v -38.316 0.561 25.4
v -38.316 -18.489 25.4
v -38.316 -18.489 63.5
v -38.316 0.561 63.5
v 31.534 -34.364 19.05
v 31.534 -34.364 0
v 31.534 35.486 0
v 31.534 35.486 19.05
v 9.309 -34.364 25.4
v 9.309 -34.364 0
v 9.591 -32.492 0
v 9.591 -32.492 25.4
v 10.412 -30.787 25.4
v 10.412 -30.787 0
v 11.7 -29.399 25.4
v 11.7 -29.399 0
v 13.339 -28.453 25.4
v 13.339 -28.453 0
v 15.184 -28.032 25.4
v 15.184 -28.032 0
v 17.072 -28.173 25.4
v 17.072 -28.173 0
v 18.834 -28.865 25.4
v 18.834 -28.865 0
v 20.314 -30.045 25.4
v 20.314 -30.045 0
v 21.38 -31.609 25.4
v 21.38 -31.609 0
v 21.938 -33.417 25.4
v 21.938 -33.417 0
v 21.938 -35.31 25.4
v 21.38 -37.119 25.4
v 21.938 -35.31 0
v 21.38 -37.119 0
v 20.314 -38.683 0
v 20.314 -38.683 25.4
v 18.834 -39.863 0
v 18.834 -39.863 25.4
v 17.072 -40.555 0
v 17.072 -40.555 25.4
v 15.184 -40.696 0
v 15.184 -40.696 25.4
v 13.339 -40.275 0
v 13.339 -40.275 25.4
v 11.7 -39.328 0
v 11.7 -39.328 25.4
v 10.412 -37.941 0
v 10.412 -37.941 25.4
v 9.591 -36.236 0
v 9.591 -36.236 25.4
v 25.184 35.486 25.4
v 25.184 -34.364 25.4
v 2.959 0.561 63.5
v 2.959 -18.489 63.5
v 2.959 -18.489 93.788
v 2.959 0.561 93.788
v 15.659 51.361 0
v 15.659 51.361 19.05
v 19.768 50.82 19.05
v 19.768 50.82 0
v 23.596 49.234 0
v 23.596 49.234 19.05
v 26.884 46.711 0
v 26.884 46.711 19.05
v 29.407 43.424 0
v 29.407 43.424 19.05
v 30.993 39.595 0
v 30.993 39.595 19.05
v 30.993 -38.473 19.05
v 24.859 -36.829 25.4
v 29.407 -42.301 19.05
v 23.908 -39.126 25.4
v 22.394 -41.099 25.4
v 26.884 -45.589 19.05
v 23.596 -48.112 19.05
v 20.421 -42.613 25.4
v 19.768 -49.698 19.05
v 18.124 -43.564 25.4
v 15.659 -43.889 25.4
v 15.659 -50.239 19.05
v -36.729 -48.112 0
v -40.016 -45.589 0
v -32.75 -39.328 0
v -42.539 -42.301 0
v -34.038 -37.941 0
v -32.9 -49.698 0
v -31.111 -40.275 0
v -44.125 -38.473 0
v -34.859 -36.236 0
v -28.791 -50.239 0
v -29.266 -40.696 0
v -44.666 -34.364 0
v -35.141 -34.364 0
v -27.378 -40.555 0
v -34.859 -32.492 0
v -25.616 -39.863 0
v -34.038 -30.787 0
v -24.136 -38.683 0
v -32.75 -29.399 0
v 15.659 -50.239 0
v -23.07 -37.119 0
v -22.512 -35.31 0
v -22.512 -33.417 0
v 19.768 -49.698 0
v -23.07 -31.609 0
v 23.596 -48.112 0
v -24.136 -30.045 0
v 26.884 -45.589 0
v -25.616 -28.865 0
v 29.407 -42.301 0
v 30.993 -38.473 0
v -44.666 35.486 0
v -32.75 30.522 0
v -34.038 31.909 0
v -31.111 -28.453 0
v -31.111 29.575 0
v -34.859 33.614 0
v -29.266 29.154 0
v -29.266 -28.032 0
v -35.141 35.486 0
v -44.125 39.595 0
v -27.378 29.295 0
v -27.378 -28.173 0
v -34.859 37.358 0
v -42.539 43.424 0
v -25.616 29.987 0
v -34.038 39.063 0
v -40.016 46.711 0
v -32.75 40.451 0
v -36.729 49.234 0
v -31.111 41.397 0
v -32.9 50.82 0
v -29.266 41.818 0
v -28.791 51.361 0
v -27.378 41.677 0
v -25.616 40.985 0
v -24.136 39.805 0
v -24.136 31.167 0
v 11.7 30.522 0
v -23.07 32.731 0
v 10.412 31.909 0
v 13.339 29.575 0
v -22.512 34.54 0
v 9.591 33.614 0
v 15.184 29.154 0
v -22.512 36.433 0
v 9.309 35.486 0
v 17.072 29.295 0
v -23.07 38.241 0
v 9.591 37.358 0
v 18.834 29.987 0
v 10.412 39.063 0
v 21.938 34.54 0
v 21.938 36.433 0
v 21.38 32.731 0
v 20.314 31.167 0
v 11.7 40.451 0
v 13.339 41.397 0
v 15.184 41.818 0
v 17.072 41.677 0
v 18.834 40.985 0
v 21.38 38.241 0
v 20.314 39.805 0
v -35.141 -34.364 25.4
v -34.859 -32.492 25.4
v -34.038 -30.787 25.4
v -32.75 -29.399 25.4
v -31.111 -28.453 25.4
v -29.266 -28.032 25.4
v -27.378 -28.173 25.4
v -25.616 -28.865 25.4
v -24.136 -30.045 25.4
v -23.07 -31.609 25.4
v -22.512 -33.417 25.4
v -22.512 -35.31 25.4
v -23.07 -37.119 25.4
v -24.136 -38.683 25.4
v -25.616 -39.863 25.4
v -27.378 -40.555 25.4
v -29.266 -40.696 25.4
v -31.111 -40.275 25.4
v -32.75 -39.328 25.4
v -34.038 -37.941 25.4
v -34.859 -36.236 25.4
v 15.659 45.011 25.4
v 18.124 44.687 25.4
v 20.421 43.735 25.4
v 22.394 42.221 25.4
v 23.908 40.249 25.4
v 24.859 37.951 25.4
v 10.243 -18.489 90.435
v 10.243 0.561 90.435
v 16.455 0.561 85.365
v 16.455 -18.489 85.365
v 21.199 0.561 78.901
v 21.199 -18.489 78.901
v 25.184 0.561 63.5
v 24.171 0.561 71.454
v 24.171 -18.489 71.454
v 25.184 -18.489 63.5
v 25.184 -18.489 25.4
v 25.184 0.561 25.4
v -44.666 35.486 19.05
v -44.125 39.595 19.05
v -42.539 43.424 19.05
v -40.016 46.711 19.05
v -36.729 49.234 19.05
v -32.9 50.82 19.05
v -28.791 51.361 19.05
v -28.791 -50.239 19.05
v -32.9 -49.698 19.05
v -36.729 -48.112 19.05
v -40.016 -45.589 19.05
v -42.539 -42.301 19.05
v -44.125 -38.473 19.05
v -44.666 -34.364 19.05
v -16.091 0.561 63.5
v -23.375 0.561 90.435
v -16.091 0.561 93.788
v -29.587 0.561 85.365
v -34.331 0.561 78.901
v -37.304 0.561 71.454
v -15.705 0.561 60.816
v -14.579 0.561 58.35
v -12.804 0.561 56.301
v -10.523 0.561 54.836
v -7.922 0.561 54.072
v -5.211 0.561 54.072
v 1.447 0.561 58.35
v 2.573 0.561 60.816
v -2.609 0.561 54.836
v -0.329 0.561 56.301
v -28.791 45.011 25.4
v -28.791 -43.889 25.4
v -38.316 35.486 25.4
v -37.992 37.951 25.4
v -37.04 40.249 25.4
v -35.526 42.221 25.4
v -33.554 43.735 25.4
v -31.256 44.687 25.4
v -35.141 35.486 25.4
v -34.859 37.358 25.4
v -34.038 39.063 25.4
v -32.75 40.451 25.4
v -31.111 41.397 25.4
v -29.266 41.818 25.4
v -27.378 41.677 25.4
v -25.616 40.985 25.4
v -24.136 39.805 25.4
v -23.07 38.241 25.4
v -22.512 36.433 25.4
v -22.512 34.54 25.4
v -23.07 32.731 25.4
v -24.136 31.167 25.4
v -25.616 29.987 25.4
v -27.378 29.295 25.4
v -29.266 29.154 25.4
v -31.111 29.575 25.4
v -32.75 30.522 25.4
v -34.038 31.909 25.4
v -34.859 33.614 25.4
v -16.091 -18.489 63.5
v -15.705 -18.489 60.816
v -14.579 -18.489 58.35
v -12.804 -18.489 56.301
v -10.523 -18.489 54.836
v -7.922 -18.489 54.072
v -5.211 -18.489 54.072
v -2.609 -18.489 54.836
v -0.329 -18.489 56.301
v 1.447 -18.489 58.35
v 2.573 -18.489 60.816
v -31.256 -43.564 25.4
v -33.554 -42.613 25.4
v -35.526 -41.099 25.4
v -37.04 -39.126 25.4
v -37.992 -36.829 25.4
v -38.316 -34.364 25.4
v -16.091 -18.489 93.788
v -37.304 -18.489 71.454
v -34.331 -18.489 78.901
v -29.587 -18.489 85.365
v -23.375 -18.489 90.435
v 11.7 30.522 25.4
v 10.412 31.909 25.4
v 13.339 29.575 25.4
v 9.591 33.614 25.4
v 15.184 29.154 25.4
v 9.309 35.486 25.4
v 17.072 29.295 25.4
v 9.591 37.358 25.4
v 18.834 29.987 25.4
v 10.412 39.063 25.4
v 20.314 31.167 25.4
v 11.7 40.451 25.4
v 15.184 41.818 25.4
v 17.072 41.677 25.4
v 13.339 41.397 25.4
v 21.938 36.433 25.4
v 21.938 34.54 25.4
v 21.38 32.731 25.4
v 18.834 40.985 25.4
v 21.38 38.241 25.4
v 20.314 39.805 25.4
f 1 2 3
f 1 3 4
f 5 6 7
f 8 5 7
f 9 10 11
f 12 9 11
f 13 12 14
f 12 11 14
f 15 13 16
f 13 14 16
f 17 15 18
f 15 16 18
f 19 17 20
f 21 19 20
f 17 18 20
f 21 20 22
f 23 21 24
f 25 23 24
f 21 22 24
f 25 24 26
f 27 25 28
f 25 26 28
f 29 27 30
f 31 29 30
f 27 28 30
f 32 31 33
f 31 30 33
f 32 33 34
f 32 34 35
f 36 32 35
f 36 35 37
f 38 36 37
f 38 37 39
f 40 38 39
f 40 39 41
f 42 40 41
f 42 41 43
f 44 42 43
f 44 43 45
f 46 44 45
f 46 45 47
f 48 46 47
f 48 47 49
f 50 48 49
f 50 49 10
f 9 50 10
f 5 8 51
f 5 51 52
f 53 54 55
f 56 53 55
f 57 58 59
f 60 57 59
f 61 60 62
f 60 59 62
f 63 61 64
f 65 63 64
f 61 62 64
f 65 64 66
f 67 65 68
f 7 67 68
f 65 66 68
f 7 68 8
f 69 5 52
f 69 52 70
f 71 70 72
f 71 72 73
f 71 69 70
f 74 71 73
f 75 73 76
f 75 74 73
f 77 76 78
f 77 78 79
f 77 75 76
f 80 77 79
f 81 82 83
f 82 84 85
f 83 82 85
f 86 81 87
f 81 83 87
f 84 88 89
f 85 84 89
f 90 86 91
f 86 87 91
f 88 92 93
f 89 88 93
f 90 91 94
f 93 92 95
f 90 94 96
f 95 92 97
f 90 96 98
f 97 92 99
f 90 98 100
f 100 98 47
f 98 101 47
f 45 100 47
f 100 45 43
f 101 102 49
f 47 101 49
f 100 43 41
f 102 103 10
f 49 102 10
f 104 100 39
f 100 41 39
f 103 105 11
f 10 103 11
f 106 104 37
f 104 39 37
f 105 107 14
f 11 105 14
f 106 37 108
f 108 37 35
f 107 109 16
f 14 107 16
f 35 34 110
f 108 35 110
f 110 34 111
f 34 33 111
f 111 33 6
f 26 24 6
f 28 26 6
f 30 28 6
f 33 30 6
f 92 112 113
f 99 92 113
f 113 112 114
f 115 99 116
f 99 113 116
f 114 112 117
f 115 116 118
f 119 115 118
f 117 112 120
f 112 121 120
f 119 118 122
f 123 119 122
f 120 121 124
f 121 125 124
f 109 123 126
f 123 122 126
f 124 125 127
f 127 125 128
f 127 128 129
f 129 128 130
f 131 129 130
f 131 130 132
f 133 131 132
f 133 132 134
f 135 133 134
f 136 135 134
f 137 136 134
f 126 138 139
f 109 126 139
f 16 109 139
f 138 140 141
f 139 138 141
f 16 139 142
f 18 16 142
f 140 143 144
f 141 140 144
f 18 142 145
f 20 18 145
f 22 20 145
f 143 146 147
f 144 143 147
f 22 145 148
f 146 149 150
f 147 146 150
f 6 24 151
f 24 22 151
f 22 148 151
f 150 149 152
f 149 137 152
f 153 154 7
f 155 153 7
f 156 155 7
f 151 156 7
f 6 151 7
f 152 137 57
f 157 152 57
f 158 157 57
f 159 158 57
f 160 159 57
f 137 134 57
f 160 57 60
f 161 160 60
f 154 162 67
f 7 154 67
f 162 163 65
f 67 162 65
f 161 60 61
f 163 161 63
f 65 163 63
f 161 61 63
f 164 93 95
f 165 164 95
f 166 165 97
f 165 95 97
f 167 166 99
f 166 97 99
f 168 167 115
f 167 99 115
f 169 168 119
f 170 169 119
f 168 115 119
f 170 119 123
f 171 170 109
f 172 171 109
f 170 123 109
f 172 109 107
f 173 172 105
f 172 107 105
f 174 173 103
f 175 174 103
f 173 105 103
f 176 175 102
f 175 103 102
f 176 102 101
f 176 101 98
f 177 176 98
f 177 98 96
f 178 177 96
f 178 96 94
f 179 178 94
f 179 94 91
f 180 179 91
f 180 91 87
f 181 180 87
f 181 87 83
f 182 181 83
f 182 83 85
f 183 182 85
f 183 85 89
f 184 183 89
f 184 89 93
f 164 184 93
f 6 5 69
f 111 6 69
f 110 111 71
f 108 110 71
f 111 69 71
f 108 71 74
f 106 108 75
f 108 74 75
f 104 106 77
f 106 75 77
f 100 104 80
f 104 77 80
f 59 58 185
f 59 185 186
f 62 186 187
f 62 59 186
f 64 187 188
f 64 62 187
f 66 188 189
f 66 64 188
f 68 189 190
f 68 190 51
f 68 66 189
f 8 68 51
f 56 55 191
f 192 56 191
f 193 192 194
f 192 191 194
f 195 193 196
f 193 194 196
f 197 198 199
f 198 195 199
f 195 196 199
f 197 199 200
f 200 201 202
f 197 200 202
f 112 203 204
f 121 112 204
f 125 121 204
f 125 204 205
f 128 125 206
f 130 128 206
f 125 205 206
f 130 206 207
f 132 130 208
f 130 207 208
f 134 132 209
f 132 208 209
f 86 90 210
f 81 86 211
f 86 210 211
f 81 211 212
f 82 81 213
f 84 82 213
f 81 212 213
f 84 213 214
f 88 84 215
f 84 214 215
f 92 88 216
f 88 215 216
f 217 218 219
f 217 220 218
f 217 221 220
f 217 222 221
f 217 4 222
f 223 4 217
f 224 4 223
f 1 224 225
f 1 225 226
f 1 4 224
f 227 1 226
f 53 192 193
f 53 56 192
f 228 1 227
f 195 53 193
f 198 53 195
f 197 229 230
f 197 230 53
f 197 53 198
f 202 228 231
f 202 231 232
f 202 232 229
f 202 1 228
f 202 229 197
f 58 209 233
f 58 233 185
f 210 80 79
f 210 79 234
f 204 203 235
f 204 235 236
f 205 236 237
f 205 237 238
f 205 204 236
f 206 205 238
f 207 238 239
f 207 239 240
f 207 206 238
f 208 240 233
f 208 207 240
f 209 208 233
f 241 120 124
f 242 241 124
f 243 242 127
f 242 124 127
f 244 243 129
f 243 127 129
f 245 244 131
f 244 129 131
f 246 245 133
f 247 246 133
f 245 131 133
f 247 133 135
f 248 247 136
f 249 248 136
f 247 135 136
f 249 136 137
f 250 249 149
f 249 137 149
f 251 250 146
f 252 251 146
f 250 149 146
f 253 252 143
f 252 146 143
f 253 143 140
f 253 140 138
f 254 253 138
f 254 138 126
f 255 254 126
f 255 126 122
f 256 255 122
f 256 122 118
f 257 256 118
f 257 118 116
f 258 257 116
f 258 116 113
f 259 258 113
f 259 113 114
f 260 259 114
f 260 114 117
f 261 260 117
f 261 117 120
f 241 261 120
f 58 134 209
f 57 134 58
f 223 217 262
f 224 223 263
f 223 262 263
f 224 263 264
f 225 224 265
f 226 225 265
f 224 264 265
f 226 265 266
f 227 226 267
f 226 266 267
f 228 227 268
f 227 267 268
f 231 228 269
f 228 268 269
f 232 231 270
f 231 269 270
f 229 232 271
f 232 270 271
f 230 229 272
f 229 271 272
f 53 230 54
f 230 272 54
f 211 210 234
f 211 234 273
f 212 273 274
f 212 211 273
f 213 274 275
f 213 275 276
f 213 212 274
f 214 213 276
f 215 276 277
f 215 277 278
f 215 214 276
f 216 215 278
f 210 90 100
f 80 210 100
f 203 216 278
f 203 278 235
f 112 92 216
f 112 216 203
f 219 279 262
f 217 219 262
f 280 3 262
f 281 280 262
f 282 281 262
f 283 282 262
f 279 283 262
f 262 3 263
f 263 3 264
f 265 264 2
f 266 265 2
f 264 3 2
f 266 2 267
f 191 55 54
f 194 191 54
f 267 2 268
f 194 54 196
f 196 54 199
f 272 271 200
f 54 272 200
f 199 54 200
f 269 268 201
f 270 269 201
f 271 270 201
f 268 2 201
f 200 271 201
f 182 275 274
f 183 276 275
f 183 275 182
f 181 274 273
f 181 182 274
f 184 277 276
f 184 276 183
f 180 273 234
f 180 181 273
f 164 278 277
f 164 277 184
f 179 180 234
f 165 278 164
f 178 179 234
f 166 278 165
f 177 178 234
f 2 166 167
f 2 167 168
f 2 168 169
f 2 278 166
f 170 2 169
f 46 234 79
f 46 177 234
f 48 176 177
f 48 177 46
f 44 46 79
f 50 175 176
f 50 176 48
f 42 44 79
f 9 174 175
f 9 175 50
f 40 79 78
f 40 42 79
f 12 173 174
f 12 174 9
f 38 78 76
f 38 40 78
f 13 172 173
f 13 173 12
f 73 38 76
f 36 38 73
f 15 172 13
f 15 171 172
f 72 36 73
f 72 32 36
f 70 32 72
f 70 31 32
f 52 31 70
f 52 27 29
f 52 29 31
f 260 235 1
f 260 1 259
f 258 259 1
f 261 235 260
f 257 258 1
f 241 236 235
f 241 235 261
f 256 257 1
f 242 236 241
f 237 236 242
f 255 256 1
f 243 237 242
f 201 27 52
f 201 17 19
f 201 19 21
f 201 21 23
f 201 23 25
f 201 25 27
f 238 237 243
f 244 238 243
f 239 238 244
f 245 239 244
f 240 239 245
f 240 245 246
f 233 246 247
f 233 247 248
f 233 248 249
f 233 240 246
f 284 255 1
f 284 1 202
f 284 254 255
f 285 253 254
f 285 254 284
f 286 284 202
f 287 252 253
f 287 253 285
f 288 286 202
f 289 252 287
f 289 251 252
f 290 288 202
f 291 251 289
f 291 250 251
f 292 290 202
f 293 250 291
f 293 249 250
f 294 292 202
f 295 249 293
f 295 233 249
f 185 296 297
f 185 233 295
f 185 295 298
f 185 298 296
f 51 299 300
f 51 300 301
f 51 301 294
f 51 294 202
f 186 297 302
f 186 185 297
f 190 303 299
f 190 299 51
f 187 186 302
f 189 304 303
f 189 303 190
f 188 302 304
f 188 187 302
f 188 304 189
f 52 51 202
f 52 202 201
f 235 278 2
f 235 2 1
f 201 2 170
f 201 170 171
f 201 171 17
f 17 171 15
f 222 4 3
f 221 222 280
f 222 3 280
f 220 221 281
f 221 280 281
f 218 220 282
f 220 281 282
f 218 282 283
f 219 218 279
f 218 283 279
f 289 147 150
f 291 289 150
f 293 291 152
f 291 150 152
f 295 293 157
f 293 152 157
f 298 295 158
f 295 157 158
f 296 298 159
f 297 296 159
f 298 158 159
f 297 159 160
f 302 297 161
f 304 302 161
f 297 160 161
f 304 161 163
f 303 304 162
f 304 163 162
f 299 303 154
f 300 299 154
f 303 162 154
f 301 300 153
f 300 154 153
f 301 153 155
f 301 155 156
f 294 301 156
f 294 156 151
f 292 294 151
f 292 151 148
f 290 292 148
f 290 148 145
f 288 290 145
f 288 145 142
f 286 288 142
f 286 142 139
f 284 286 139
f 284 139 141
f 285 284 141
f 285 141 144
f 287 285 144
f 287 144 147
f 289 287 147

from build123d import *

# Parameters (mm, degrees)
F0_W     = 76.2
F0_H     = 101.6
F1_DEPTH = 25.4
F2_W     = 63.5
F2_H     = 19.05
F3_DEPTH = 76.2
F5_DEPTH = 54.60239
F6_DEPTH = 25.4
F8_D     = 12.7
F8_DEPTH = 215.9
F8_TIP   = 3.8154649308
F9_DEPTH = 25.4
F10_SIZE = 6.34999


# Not quite as in the source:
# - a fillet or chamfer is up to 0.001 mm smaller than in the source, because OpenCascade refuses the exact size


with BuildPart() as f1:
    # F0 (on Top) → F1 (new body)
    with BuildSketch(Plane.XY):
        with Locations((-6.5660695493, 0.5611634433)):
            Rectangle(F0_W, F0_H)
    extrude(amount=F1_DEPTH)

    # F2 (on face) → F3 (join)
    with BuildSketch(Plane.XY.offset(25.4)):
        with Locations((-6.5660695493, -8.9638365567)):
            Rectangle(F2_W, F2_H)
    extrude(amount=F3_DEPTH)

    # F4 (on face) → F5 (cut)
    with BuildSketch(Plane.XZ.offset(18.4888365567)):
        with BuildLine():
            Line((-38.3160695493, 101.6), (-38.3160695493, 63.5))
            ThreePointArc((-38.3160695493, 63.5), (-32.1637379002, 82.2835533113), (-16.0910695493, 93.787569645))
            Line((-16.0910695493, 93.787569645), (-16.0910695493, 101.6))
            Line((-16.0910695493, 101.6), (-38.3160695493, 101.6))
        make_face()
        with BuildLine():
            ThreePointArc((-16.0910695493, 93.787569645), (-6.5660695493, 95.25), (2.9589304507, 93.787569645))
            Line((2.9589304507, 93.787569645), (2.9589304507, 101.6))
            Line((2.9589304507, 101.6), (-16.0910695493, 101.6))
            Line((-16.0910695493, 101.6), (-16.0910695493, 93.787569645))
        make_face()
        with BuildLine():
            ThreePointArc((2.9589304507, 93.787569645), (19.0315988015, 82.2835533113), (25.1839304507, 63.5))
            Line((25.1839304507, 63.5), (25.1839304507, 101.6))
            Line((25.1839304507, 101.6), (2.9589304507, 101.6))
            Line((2.9589304507, 101.6), (2.9589304507, 93.787569645))
        make_face()
    extrude(amount=-F5_DEPTH, mode=Mode.SUBTRACT)

    # F4 (on face) → F6 (cut)
    with BuildSketch(Plane.XZ.offset(18.4888365567)):
        with BuildLine():
            Line((2.9589304507, 63.5), (2.9589304507, 93.787569645))
            ThreePointArc((2.9589304507, 93.787569645), (-6.5660695493, 95.25), (-16.0910695493, 93.787569645))
            Line((-16.0910695493, 93.787569645), (-16.0910695493, 63.5))
            ThreePointArc((-16.0910695493, 63.5), (-6.5660695493, 73.025), (2.9589304507, 63.5))
        make_face()
        with BuildLine():
            ThreePointArc((-16.0910695493, 63.5), (-13.3012616401, 56.7648079092), (-6.5660695493, 53.975))
            ThreePointArc((-6.5660695493, 53.975), (0.1691225415, 56.7648079092), (2.9589304507, 63.5))
            ThreePointArc((2.9589304507, 63.5), (-6.5660695493, 73.025), (-16.0910695493, 63.5))
        make_face()
    extrude(amount=-F6_DEPTH, mode=Mode.SUBTRACT)

    # F8
    with Locations(Plane.XY.offset(25.4)):
        with Locations((-28.7910695493, 35.4861634433), (15.6589304507, 35.4861634433), (15.6589304507, -34.3638365567), (-28.7910695493, -34.3638365567)):
            Hole(F8_D / 2, depth=F8_DEPTH)
            with Locations((0, 0, -(F8_DEPTH + F8_TIP / 2))):  # 118° drill point
                Cone(0, F8_D / 2, F8_TIP, mode=Mode.SUBTRACT)

    # F7 (on face) → F9 (cut)
    with BuildSketch(Plane.XY.offset(25.4)):
        with BuildLine():
            ThreePointArc((-44.6660695493, 35.4861634433), (-40.0163896548, 46.7114836405), (-28.7910694197, 51.3611634433))
            Line((-28.7910694197, 51.3611634433), (-44.6660695493, 51.3611634433))
            Line((-44.6660695493, 51.3611634433), (-44.6660695493, 35.4861634433))
        make_face()
        with BuildLine():
            Line((31.5339304507, 51.3611634433), (15.6589304507, 51.3611634433))
            ThreePointArc((15.6589304507, 51.3611634433), (26.884250602, 46.7114835947), (31.5339304507, 35.4861634433))
            Line((31.5339304507, 35.4861634433), (31.5339304507, 51.3611634433))
        make_face()
        with BuildLine():
            Line((31.5339304507, -50.2388365567), (31.5339304507, -34.3638365567))
            ThreePointArc((31.5339304507, -34.3638365567), (26.8842505737, -45.5891567363), (15.6589303706, -50.2388365567))
            Line((15.6589303706, -50.2388365567), (31.5339304507, -50.2388365567))
        make_face()
        with BuildLine():
            ThreePointArc((-28.7910695493, -50.2388365567), (-40.0163897007, -45.589156708), (-44.6660695493, -34.3638365567))
            Line((-44.6660695493, -34.3638365567), (-44.6660695493, -50.2388365567))
            Line((-44.6660695493, -50.2388365567), (-28.7910695493, -50.2388365567))
        make_face()
    extrude(amount=-F9_DEPTH, mode=Mode.SUBTRACT)

    # F10 (size 6.35 in the source; OpenCascade refuses exactly that, so slightly less here)
    f10_edges = [f1.edges().sort_by_distance(p)[0] for p in [
        (26.884251, -45.589157, 25.4),
        (31.53393, 0.561163, 25.4),
        (26.884251, 46.711484, 25.4),
        (-6.566069, 51.361163, 25.4),
        (-40.01639, 46.711484, 25.4),
        (-44.66607, 0.561163, 25.4),
        (-40.01639, -45.589157, 25.4),
        (-6.56607, -50.238837, 25.4),
    ]]
    chamfer(f10_edges, length=F10_SIZE)


solid = f1.part
